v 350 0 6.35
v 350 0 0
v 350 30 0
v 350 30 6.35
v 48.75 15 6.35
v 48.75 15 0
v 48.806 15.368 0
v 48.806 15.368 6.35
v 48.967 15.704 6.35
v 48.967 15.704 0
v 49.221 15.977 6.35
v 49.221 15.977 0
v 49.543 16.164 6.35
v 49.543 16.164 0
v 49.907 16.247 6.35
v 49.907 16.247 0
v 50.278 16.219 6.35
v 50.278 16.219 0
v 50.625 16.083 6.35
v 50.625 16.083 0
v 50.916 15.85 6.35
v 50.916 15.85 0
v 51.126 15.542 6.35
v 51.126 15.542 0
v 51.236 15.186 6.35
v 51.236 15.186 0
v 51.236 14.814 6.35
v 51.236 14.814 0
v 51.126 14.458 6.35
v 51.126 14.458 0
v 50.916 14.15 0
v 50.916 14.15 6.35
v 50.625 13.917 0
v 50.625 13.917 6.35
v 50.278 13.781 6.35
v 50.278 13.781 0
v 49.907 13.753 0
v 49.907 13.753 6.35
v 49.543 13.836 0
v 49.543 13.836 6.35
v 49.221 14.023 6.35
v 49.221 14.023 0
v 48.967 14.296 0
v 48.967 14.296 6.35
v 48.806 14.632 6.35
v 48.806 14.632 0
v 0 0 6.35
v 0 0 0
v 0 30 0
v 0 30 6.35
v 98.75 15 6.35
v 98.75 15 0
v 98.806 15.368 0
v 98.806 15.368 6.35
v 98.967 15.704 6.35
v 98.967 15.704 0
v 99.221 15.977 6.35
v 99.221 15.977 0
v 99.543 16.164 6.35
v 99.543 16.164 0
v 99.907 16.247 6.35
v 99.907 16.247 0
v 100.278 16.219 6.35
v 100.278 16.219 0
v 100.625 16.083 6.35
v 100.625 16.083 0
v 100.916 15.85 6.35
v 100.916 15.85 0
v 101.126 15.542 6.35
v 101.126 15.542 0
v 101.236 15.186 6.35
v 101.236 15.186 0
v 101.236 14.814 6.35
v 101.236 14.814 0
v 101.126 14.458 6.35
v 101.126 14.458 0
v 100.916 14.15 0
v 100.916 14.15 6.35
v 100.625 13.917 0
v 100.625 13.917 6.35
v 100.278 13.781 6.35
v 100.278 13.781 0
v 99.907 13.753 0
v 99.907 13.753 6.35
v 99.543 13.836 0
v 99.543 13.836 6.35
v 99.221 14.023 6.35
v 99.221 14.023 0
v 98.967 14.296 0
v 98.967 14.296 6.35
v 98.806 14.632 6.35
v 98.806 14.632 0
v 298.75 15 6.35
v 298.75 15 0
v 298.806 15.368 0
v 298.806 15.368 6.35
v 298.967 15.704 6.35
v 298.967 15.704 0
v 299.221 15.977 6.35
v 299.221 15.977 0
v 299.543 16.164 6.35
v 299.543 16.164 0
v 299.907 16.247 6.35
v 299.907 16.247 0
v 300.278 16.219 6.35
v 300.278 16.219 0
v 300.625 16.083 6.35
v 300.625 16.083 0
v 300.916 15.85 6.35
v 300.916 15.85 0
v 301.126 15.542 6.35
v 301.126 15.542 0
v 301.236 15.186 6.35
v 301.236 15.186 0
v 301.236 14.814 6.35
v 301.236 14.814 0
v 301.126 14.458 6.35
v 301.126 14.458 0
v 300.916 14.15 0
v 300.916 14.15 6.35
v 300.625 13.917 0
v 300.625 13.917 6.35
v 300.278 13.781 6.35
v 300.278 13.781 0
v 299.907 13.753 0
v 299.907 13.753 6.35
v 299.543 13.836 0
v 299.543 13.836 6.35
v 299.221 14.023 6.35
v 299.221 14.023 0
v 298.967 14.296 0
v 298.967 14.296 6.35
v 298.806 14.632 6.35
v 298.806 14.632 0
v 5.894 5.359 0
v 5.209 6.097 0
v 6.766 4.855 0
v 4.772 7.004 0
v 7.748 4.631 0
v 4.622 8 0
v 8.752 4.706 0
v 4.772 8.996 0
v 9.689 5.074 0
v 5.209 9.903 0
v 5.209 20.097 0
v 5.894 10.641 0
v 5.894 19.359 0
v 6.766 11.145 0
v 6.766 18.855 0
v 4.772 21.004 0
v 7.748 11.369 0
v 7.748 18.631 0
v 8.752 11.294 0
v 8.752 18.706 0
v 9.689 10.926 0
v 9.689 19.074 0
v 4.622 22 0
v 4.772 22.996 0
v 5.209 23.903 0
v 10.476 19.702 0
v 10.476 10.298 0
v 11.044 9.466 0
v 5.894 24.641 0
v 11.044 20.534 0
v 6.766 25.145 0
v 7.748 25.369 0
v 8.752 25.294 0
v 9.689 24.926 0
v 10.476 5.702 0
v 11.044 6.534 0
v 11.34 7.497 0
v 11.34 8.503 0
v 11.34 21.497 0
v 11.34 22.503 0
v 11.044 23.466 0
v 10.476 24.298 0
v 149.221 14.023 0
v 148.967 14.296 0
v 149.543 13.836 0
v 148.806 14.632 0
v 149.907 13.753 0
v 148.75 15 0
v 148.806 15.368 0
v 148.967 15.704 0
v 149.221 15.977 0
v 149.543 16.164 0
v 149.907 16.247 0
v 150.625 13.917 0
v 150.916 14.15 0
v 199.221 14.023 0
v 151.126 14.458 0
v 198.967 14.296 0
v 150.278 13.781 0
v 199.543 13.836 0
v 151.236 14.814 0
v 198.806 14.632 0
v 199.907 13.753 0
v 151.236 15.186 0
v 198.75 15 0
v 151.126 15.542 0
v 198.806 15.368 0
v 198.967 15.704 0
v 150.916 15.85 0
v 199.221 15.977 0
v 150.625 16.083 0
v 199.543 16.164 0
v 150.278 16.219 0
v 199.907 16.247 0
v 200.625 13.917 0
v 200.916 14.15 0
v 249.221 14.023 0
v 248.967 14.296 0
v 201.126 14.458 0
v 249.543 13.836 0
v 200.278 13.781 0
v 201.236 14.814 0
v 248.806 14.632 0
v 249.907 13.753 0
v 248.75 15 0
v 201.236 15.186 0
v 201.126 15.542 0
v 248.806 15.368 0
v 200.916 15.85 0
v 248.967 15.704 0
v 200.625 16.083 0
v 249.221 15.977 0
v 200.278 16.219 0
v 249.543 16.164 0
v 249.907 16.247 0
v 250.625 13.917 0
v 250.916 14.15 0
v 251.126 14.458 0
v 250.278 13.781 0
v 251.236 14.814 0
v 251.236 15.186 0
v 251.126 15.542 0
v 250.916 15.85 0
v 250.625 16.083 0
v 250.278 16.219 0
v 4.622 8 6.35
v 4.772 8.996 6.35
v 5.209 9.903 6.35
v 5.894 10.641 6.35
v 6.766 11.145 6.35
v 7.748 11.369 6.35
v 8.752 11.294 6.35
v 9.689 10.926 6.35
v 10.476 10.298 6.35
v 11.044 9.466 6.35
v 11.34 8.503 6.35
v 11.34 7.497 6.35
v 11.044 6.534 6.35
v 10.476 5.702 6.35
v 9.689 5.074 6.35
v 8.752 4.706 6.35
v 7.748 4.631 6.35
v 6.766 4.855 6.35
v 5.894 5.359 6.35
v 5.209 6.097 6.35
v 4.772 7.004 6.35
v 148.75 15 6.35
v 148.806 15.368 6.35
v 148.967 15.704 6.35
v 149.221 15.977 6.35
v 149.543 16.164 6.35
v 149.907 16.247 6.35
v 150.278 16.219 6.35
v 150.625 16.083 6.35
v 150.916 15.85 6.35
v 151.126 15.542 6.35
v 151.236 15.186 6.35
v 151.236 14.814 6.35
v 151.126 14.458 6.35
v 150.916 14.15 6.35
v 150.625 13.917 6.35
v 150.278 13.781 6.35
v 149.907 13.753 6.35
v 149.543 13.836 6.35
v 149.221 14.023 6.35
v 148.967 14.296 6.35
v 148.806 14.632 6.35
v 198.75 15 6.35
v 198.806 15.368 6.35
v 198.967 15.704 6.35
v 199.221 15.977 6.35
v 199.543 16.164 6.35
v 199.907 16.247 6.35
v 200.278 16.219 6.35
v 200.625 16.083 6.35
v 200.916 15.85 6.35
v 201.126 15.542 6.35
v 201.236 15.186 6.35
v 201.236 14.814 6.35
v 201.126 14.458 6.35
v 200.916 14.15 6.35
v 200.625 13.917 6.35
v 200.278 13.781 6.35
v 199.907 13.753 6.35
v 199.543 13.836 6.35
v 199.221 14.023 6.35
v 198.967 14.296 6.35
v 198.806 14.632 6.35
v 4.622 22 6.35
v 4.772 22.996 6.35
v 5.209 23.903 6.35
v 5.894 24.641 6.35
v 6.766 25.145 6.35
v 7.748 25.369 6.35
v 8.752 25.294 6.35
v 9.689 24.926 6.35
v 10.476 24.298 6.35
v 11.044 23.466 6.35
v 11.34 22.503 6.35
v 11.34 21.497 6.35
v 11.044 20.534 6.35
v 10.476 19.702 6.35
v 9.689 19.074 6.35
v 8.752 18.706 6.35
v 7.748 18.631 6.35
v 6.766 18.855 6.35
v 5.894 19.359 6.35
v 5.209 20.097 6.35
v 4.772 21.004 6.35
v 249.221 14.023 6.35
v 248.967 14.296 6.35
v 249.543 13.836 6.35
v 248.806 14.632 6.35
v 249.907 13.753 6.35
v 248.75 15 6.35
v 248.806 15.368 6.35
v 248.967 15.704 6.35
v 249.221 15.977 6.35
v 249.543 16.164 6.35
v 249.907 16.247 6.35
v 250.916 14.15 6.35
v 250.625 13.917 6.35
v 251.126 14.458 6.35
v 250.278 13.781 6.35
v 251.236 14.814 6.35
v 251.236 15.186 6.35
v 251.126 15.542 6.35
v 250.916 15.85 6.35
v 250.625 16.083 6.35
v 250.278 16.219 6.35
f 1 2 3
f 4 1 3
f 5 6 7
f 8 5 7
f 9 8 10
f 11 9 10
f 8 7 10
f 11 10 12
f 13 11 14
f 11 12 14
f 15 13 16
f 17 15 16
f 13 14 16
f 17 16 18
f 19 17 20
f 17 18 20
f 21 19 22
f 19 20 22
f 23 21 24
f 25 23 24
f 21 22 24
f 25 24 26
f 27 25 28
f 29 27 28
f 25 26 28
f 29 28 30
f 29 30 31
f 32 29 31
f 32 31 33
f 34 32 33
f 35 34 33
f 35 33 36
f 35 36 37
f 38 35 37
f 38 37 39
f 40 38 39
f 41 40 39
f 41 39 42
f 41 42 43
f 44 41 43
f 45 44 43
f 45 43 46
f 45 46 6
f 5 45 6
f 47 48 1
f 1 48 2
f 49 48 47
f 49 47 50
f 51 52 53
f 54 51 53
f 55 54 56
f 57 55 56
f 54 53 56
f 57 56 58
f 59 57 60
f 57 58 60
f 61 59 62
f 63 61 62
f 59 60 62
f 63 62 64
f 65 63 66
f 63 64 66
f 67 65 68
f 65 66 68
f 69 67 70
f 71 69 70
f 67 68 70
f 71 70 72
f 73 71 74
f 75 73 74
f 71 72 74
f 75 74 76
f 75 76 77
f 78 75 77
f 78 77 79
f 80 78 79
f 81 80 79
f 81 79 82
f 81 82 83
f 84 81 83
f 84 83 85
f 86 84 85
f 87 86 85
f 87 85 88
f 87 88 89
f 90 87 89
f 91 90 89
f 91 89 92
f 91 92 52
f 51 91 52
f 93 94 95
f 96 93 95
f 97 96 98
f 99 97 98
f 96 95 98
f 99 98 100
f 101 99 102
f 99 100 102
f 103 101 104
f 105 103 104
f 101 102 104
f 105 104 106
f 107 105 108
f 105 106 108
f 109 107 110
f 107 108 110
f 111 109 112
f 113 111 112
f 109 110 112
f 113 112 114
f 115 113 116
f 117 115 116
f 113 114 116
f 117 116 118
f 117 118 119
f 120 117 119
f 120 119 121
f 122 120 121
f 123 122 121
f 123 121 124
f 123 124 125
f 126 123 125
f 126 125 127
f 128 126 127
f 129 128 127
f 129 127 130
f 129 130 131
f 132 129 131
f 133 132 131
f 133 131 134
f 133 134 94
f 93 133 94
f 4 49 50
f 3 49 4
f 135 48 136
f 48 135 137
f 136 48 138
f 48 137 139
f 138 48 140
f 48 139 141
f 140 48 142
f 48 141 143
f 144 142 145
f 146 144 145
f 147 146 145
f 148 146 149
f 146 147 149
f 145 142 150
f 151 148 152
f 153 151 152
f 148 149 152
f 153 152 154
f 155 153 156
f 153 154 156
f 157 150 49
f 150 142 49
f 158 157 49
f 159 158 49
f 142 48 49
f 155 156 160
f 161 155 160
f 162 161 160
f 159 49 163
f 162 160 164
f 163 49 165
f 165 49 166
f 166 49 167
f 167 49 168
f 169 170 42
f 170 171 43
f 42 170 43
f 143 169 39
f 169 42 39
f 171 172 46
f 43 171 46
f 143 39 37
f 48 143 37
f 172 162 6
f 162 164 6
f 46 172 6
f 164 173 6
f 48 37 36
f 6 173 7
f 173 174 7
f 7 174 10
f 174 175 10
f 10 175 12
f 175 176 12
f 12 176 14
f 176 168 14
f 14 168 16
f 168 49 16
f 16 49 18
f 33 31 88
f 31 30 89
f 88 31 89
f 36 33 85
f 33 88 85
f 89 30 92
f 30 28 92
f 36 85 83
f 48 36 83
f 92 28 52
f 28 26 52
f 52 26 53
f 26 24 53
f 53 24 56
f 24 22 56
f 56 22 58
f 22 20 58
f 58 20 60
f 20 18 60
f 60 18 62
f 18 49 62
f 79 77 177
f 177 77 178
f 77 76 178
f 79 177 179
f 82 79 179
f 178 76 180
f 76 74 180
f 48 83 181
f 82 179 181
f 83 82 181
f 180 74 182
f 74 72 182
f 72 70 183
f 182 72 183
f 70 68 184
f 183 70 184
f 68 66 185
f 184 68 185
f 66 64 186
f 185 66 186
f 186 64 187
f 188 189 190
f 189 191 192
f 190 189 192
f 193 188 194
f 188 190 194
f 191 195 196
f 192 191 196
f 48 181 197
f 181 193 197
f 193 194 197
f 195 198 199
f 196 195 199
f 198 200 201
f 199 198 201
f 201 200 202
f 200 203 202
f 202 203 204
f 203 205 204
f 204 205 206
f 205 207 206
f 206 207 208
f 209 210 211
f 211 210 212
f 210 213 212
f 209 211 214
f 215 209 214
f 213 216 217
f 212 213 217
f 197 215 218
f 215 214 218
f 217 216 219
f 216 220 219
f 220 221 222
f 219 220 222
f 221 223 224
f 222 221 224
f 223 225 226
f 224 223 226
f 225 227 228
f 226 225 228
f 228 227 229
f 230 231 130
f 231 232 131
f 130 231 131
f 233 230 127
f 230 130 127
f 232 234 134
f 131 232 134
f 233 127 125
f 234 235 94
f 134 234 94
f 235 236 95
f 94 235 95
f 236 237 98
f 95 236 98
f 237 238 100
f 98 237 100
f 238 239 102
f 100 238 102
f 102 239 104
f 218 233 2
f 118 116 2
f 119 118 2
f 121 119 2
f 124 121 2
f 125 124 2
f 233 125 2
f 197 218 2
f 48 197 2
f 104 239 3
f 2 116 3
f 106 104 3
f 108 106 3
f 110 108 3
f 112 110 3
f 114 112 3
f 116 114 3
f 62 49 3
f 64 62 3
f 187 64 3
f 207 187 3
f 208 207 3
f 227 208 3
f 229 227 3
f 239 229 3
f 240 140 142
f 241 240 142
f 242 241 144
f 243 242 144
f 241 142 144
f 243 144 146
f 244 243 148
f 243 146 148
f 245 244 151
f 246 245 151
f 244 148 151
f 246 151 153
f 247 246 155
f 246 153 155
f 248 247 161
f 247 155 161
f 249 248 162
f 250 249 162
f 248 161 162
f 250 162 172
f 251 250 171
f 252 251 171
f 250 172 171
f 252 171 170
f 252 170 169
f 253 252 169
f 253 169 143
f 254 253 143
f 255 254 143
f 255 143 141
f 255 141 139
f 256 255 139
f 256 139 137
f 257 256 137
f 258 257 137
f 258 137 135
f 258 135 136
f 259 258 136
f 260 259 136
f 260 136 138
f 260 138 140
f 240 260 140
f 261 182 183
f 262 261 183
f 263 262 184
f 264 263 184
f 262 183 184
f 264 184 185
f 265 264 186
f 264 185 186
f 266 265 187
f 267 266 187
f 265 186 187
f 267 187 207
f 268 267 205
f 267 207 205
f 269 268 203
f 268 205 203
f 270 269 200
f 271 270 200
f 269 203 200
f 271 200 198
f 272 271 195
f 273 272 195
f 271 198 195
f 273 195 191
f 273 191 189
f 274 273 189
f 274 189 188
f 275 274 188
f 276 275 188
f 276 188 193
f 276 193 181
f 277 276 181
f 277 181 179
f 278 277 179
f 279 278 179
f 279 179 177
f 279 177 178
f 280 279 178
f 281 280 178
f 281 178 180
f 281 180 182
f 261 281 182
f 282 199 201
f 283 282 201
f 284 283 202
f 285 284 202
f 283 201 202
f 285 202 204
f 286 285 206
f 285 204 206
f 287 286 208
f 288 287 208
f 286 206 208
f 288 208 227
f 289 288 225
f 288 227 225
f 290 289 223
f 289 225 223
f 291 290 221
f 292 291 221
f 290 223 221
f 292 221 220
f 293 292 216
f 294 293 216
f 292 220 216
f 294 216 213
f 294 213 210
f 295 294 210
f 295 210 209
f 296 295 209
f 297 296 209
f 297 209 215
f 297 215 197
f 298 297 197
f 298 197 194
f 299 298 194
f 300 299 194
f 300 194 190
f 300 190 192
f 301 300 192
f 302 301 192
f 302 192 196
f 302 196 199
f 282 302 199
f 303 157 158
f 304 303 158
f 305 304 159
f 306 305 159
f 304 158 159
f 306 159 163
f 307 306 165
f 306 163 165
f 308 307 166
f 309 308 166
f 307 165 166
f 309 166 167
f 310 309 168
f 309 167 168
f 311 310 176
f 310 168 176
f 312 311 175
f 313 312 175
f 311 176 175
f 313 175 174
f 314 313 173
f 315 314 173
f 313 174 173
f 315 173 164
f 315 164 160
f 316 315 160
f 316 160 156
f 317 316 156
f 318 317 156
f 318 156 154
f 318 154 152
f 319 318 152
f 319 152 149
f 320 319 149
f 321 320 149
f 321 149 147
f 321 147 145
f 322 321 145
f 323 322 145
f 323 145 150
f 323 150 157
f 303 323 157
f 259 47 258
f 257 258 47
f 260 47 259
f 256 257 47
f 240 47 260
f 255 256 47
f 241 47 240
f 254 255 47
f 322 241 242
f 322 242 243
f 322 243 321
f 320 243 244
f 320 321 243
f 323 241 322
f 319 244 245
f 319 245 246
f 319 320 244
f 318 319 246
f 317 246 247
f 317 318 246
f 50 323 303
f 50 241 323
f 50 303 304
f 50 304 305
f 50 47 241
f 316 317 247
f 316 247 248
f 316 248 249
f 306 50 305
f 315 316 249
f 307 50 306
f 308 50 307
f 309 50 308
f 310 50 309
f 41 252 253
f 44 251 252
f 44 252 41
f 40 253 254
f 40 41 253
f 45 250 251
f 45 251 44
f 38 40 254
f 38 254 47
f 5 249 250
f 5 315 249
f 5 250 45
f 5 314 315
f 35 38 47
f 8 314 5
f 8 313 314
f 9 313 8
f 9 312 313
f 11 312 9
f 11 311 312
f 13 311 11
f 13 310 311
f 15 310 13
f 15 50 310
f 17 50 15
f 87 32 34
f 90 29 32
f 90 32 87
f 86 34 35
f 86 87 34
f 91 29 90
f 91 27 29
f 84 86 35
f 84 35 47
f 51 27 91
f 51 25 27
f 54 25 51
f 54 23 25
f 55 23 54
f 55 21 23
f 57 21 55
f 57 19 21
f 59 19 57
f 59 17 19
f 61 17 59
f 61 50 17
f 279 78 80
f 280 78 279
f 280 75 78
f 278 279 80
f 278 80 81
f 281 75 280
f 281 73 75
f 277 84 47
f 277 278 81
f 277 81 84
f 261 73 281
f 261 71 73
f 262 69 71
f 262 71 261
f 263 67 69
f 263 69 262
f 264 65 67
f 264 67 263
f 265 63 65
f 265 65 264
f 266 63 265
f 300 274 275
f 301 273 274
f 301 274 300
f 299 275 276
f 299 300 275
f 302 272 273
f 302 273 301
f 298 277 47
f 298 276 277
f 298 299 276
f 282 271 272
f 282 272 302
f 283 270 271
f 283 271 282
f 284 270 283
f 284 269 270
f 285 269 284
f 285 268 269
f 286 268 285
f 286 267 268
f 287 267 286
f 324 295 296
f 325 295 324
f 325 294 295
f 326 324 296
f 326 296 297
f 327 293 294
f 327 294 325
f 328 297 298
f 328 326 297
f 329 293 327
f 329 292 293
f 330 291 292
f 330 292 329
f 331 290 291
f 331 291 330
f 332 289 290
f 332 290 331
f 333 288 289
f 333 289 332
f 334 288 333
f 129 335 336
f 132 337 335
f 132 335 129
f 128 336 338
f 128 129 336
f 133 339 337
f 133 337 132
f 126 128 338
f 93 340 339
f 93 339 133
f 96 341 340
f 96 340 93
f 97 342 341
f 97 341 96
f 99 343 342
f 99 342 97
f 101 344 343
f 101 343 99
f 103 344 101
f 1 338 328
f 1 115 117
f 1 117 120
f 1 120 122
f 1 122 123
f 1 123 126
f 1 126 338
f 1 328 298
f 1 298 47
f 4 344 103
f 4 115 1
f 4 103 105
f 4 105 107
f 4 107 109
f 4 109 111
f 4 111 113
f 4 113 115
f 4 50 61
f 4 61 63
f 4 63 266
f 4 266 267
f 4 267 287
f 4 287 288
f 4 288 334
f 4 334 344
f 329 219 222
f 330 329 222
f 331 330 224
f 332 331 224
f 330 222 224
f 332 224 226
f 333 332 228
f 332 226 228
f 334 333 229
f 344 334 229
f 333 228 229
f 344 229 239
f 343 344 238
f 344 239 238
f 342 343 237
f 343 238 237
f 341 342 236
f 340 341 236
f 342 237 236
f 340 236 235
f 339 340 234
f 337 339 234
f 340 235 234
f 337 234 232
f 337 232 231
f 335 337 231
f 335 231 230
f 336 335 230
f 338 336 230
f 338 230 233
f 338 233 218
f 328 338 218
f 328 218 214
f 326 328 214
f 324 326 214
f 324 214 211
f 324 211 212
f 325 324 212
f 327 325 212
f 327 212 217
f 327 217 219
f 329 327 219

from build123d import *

# Parameters (mm, degrees)
SKETCH2_W                   = 350
SKETCH2_H                   = 30
BOSS_EXTRUDE1_DEPTH         = 6.35
F_1_4_CLEARANCE_HOLE1_D     = 6.7564
TAP_DRILL_FOR_M3X0_5_TAP1_D = 2.5
LPATTERN1_COUNT             = 6
LPATTERN1_PITCH             = 50


with BuildPart() as part:
    # Sketch2 → Boss-Extrude1 (new body)
    with BuildSketch(Plane.XY):
        with Locations((175, 15)):
            Rectangle(SKETCH2_W, SKETCH2_H)
    extrude(amount=BOSS_EXTRUDE1_DEPTH)

    # 1/4 Clearance Hole1 (through all)
    with Locations(Plane.XY.offset(6.35)):
        with Locations((8, 22), (8, 8)):
            Hole(F_1_4_CLEARANCE_HOLE1_D / 2)

    # Tap Drill for M3x0.5 Tap1 (through all)
    with Locations(Plane.XY.offset(6.35)):
        with Locations((50, 15)):
            tap_drill_for_m3x0_5_tap1 = Hole(TAP_DRILL_FOR_M3X0_5_TAP1_D / 2)

    # LPattern1: Tap Drill for M3x0.5 Tap1 ×6
    with Locations(*[(i * LPATTERN1_PITCH, 0, 0) for i in range(1, LPATTERN1_COUNT)]):
        add(tap_drill_for_m3x0_5_tap1, mode=Mode.SUBTRACT)


solid = part.part
